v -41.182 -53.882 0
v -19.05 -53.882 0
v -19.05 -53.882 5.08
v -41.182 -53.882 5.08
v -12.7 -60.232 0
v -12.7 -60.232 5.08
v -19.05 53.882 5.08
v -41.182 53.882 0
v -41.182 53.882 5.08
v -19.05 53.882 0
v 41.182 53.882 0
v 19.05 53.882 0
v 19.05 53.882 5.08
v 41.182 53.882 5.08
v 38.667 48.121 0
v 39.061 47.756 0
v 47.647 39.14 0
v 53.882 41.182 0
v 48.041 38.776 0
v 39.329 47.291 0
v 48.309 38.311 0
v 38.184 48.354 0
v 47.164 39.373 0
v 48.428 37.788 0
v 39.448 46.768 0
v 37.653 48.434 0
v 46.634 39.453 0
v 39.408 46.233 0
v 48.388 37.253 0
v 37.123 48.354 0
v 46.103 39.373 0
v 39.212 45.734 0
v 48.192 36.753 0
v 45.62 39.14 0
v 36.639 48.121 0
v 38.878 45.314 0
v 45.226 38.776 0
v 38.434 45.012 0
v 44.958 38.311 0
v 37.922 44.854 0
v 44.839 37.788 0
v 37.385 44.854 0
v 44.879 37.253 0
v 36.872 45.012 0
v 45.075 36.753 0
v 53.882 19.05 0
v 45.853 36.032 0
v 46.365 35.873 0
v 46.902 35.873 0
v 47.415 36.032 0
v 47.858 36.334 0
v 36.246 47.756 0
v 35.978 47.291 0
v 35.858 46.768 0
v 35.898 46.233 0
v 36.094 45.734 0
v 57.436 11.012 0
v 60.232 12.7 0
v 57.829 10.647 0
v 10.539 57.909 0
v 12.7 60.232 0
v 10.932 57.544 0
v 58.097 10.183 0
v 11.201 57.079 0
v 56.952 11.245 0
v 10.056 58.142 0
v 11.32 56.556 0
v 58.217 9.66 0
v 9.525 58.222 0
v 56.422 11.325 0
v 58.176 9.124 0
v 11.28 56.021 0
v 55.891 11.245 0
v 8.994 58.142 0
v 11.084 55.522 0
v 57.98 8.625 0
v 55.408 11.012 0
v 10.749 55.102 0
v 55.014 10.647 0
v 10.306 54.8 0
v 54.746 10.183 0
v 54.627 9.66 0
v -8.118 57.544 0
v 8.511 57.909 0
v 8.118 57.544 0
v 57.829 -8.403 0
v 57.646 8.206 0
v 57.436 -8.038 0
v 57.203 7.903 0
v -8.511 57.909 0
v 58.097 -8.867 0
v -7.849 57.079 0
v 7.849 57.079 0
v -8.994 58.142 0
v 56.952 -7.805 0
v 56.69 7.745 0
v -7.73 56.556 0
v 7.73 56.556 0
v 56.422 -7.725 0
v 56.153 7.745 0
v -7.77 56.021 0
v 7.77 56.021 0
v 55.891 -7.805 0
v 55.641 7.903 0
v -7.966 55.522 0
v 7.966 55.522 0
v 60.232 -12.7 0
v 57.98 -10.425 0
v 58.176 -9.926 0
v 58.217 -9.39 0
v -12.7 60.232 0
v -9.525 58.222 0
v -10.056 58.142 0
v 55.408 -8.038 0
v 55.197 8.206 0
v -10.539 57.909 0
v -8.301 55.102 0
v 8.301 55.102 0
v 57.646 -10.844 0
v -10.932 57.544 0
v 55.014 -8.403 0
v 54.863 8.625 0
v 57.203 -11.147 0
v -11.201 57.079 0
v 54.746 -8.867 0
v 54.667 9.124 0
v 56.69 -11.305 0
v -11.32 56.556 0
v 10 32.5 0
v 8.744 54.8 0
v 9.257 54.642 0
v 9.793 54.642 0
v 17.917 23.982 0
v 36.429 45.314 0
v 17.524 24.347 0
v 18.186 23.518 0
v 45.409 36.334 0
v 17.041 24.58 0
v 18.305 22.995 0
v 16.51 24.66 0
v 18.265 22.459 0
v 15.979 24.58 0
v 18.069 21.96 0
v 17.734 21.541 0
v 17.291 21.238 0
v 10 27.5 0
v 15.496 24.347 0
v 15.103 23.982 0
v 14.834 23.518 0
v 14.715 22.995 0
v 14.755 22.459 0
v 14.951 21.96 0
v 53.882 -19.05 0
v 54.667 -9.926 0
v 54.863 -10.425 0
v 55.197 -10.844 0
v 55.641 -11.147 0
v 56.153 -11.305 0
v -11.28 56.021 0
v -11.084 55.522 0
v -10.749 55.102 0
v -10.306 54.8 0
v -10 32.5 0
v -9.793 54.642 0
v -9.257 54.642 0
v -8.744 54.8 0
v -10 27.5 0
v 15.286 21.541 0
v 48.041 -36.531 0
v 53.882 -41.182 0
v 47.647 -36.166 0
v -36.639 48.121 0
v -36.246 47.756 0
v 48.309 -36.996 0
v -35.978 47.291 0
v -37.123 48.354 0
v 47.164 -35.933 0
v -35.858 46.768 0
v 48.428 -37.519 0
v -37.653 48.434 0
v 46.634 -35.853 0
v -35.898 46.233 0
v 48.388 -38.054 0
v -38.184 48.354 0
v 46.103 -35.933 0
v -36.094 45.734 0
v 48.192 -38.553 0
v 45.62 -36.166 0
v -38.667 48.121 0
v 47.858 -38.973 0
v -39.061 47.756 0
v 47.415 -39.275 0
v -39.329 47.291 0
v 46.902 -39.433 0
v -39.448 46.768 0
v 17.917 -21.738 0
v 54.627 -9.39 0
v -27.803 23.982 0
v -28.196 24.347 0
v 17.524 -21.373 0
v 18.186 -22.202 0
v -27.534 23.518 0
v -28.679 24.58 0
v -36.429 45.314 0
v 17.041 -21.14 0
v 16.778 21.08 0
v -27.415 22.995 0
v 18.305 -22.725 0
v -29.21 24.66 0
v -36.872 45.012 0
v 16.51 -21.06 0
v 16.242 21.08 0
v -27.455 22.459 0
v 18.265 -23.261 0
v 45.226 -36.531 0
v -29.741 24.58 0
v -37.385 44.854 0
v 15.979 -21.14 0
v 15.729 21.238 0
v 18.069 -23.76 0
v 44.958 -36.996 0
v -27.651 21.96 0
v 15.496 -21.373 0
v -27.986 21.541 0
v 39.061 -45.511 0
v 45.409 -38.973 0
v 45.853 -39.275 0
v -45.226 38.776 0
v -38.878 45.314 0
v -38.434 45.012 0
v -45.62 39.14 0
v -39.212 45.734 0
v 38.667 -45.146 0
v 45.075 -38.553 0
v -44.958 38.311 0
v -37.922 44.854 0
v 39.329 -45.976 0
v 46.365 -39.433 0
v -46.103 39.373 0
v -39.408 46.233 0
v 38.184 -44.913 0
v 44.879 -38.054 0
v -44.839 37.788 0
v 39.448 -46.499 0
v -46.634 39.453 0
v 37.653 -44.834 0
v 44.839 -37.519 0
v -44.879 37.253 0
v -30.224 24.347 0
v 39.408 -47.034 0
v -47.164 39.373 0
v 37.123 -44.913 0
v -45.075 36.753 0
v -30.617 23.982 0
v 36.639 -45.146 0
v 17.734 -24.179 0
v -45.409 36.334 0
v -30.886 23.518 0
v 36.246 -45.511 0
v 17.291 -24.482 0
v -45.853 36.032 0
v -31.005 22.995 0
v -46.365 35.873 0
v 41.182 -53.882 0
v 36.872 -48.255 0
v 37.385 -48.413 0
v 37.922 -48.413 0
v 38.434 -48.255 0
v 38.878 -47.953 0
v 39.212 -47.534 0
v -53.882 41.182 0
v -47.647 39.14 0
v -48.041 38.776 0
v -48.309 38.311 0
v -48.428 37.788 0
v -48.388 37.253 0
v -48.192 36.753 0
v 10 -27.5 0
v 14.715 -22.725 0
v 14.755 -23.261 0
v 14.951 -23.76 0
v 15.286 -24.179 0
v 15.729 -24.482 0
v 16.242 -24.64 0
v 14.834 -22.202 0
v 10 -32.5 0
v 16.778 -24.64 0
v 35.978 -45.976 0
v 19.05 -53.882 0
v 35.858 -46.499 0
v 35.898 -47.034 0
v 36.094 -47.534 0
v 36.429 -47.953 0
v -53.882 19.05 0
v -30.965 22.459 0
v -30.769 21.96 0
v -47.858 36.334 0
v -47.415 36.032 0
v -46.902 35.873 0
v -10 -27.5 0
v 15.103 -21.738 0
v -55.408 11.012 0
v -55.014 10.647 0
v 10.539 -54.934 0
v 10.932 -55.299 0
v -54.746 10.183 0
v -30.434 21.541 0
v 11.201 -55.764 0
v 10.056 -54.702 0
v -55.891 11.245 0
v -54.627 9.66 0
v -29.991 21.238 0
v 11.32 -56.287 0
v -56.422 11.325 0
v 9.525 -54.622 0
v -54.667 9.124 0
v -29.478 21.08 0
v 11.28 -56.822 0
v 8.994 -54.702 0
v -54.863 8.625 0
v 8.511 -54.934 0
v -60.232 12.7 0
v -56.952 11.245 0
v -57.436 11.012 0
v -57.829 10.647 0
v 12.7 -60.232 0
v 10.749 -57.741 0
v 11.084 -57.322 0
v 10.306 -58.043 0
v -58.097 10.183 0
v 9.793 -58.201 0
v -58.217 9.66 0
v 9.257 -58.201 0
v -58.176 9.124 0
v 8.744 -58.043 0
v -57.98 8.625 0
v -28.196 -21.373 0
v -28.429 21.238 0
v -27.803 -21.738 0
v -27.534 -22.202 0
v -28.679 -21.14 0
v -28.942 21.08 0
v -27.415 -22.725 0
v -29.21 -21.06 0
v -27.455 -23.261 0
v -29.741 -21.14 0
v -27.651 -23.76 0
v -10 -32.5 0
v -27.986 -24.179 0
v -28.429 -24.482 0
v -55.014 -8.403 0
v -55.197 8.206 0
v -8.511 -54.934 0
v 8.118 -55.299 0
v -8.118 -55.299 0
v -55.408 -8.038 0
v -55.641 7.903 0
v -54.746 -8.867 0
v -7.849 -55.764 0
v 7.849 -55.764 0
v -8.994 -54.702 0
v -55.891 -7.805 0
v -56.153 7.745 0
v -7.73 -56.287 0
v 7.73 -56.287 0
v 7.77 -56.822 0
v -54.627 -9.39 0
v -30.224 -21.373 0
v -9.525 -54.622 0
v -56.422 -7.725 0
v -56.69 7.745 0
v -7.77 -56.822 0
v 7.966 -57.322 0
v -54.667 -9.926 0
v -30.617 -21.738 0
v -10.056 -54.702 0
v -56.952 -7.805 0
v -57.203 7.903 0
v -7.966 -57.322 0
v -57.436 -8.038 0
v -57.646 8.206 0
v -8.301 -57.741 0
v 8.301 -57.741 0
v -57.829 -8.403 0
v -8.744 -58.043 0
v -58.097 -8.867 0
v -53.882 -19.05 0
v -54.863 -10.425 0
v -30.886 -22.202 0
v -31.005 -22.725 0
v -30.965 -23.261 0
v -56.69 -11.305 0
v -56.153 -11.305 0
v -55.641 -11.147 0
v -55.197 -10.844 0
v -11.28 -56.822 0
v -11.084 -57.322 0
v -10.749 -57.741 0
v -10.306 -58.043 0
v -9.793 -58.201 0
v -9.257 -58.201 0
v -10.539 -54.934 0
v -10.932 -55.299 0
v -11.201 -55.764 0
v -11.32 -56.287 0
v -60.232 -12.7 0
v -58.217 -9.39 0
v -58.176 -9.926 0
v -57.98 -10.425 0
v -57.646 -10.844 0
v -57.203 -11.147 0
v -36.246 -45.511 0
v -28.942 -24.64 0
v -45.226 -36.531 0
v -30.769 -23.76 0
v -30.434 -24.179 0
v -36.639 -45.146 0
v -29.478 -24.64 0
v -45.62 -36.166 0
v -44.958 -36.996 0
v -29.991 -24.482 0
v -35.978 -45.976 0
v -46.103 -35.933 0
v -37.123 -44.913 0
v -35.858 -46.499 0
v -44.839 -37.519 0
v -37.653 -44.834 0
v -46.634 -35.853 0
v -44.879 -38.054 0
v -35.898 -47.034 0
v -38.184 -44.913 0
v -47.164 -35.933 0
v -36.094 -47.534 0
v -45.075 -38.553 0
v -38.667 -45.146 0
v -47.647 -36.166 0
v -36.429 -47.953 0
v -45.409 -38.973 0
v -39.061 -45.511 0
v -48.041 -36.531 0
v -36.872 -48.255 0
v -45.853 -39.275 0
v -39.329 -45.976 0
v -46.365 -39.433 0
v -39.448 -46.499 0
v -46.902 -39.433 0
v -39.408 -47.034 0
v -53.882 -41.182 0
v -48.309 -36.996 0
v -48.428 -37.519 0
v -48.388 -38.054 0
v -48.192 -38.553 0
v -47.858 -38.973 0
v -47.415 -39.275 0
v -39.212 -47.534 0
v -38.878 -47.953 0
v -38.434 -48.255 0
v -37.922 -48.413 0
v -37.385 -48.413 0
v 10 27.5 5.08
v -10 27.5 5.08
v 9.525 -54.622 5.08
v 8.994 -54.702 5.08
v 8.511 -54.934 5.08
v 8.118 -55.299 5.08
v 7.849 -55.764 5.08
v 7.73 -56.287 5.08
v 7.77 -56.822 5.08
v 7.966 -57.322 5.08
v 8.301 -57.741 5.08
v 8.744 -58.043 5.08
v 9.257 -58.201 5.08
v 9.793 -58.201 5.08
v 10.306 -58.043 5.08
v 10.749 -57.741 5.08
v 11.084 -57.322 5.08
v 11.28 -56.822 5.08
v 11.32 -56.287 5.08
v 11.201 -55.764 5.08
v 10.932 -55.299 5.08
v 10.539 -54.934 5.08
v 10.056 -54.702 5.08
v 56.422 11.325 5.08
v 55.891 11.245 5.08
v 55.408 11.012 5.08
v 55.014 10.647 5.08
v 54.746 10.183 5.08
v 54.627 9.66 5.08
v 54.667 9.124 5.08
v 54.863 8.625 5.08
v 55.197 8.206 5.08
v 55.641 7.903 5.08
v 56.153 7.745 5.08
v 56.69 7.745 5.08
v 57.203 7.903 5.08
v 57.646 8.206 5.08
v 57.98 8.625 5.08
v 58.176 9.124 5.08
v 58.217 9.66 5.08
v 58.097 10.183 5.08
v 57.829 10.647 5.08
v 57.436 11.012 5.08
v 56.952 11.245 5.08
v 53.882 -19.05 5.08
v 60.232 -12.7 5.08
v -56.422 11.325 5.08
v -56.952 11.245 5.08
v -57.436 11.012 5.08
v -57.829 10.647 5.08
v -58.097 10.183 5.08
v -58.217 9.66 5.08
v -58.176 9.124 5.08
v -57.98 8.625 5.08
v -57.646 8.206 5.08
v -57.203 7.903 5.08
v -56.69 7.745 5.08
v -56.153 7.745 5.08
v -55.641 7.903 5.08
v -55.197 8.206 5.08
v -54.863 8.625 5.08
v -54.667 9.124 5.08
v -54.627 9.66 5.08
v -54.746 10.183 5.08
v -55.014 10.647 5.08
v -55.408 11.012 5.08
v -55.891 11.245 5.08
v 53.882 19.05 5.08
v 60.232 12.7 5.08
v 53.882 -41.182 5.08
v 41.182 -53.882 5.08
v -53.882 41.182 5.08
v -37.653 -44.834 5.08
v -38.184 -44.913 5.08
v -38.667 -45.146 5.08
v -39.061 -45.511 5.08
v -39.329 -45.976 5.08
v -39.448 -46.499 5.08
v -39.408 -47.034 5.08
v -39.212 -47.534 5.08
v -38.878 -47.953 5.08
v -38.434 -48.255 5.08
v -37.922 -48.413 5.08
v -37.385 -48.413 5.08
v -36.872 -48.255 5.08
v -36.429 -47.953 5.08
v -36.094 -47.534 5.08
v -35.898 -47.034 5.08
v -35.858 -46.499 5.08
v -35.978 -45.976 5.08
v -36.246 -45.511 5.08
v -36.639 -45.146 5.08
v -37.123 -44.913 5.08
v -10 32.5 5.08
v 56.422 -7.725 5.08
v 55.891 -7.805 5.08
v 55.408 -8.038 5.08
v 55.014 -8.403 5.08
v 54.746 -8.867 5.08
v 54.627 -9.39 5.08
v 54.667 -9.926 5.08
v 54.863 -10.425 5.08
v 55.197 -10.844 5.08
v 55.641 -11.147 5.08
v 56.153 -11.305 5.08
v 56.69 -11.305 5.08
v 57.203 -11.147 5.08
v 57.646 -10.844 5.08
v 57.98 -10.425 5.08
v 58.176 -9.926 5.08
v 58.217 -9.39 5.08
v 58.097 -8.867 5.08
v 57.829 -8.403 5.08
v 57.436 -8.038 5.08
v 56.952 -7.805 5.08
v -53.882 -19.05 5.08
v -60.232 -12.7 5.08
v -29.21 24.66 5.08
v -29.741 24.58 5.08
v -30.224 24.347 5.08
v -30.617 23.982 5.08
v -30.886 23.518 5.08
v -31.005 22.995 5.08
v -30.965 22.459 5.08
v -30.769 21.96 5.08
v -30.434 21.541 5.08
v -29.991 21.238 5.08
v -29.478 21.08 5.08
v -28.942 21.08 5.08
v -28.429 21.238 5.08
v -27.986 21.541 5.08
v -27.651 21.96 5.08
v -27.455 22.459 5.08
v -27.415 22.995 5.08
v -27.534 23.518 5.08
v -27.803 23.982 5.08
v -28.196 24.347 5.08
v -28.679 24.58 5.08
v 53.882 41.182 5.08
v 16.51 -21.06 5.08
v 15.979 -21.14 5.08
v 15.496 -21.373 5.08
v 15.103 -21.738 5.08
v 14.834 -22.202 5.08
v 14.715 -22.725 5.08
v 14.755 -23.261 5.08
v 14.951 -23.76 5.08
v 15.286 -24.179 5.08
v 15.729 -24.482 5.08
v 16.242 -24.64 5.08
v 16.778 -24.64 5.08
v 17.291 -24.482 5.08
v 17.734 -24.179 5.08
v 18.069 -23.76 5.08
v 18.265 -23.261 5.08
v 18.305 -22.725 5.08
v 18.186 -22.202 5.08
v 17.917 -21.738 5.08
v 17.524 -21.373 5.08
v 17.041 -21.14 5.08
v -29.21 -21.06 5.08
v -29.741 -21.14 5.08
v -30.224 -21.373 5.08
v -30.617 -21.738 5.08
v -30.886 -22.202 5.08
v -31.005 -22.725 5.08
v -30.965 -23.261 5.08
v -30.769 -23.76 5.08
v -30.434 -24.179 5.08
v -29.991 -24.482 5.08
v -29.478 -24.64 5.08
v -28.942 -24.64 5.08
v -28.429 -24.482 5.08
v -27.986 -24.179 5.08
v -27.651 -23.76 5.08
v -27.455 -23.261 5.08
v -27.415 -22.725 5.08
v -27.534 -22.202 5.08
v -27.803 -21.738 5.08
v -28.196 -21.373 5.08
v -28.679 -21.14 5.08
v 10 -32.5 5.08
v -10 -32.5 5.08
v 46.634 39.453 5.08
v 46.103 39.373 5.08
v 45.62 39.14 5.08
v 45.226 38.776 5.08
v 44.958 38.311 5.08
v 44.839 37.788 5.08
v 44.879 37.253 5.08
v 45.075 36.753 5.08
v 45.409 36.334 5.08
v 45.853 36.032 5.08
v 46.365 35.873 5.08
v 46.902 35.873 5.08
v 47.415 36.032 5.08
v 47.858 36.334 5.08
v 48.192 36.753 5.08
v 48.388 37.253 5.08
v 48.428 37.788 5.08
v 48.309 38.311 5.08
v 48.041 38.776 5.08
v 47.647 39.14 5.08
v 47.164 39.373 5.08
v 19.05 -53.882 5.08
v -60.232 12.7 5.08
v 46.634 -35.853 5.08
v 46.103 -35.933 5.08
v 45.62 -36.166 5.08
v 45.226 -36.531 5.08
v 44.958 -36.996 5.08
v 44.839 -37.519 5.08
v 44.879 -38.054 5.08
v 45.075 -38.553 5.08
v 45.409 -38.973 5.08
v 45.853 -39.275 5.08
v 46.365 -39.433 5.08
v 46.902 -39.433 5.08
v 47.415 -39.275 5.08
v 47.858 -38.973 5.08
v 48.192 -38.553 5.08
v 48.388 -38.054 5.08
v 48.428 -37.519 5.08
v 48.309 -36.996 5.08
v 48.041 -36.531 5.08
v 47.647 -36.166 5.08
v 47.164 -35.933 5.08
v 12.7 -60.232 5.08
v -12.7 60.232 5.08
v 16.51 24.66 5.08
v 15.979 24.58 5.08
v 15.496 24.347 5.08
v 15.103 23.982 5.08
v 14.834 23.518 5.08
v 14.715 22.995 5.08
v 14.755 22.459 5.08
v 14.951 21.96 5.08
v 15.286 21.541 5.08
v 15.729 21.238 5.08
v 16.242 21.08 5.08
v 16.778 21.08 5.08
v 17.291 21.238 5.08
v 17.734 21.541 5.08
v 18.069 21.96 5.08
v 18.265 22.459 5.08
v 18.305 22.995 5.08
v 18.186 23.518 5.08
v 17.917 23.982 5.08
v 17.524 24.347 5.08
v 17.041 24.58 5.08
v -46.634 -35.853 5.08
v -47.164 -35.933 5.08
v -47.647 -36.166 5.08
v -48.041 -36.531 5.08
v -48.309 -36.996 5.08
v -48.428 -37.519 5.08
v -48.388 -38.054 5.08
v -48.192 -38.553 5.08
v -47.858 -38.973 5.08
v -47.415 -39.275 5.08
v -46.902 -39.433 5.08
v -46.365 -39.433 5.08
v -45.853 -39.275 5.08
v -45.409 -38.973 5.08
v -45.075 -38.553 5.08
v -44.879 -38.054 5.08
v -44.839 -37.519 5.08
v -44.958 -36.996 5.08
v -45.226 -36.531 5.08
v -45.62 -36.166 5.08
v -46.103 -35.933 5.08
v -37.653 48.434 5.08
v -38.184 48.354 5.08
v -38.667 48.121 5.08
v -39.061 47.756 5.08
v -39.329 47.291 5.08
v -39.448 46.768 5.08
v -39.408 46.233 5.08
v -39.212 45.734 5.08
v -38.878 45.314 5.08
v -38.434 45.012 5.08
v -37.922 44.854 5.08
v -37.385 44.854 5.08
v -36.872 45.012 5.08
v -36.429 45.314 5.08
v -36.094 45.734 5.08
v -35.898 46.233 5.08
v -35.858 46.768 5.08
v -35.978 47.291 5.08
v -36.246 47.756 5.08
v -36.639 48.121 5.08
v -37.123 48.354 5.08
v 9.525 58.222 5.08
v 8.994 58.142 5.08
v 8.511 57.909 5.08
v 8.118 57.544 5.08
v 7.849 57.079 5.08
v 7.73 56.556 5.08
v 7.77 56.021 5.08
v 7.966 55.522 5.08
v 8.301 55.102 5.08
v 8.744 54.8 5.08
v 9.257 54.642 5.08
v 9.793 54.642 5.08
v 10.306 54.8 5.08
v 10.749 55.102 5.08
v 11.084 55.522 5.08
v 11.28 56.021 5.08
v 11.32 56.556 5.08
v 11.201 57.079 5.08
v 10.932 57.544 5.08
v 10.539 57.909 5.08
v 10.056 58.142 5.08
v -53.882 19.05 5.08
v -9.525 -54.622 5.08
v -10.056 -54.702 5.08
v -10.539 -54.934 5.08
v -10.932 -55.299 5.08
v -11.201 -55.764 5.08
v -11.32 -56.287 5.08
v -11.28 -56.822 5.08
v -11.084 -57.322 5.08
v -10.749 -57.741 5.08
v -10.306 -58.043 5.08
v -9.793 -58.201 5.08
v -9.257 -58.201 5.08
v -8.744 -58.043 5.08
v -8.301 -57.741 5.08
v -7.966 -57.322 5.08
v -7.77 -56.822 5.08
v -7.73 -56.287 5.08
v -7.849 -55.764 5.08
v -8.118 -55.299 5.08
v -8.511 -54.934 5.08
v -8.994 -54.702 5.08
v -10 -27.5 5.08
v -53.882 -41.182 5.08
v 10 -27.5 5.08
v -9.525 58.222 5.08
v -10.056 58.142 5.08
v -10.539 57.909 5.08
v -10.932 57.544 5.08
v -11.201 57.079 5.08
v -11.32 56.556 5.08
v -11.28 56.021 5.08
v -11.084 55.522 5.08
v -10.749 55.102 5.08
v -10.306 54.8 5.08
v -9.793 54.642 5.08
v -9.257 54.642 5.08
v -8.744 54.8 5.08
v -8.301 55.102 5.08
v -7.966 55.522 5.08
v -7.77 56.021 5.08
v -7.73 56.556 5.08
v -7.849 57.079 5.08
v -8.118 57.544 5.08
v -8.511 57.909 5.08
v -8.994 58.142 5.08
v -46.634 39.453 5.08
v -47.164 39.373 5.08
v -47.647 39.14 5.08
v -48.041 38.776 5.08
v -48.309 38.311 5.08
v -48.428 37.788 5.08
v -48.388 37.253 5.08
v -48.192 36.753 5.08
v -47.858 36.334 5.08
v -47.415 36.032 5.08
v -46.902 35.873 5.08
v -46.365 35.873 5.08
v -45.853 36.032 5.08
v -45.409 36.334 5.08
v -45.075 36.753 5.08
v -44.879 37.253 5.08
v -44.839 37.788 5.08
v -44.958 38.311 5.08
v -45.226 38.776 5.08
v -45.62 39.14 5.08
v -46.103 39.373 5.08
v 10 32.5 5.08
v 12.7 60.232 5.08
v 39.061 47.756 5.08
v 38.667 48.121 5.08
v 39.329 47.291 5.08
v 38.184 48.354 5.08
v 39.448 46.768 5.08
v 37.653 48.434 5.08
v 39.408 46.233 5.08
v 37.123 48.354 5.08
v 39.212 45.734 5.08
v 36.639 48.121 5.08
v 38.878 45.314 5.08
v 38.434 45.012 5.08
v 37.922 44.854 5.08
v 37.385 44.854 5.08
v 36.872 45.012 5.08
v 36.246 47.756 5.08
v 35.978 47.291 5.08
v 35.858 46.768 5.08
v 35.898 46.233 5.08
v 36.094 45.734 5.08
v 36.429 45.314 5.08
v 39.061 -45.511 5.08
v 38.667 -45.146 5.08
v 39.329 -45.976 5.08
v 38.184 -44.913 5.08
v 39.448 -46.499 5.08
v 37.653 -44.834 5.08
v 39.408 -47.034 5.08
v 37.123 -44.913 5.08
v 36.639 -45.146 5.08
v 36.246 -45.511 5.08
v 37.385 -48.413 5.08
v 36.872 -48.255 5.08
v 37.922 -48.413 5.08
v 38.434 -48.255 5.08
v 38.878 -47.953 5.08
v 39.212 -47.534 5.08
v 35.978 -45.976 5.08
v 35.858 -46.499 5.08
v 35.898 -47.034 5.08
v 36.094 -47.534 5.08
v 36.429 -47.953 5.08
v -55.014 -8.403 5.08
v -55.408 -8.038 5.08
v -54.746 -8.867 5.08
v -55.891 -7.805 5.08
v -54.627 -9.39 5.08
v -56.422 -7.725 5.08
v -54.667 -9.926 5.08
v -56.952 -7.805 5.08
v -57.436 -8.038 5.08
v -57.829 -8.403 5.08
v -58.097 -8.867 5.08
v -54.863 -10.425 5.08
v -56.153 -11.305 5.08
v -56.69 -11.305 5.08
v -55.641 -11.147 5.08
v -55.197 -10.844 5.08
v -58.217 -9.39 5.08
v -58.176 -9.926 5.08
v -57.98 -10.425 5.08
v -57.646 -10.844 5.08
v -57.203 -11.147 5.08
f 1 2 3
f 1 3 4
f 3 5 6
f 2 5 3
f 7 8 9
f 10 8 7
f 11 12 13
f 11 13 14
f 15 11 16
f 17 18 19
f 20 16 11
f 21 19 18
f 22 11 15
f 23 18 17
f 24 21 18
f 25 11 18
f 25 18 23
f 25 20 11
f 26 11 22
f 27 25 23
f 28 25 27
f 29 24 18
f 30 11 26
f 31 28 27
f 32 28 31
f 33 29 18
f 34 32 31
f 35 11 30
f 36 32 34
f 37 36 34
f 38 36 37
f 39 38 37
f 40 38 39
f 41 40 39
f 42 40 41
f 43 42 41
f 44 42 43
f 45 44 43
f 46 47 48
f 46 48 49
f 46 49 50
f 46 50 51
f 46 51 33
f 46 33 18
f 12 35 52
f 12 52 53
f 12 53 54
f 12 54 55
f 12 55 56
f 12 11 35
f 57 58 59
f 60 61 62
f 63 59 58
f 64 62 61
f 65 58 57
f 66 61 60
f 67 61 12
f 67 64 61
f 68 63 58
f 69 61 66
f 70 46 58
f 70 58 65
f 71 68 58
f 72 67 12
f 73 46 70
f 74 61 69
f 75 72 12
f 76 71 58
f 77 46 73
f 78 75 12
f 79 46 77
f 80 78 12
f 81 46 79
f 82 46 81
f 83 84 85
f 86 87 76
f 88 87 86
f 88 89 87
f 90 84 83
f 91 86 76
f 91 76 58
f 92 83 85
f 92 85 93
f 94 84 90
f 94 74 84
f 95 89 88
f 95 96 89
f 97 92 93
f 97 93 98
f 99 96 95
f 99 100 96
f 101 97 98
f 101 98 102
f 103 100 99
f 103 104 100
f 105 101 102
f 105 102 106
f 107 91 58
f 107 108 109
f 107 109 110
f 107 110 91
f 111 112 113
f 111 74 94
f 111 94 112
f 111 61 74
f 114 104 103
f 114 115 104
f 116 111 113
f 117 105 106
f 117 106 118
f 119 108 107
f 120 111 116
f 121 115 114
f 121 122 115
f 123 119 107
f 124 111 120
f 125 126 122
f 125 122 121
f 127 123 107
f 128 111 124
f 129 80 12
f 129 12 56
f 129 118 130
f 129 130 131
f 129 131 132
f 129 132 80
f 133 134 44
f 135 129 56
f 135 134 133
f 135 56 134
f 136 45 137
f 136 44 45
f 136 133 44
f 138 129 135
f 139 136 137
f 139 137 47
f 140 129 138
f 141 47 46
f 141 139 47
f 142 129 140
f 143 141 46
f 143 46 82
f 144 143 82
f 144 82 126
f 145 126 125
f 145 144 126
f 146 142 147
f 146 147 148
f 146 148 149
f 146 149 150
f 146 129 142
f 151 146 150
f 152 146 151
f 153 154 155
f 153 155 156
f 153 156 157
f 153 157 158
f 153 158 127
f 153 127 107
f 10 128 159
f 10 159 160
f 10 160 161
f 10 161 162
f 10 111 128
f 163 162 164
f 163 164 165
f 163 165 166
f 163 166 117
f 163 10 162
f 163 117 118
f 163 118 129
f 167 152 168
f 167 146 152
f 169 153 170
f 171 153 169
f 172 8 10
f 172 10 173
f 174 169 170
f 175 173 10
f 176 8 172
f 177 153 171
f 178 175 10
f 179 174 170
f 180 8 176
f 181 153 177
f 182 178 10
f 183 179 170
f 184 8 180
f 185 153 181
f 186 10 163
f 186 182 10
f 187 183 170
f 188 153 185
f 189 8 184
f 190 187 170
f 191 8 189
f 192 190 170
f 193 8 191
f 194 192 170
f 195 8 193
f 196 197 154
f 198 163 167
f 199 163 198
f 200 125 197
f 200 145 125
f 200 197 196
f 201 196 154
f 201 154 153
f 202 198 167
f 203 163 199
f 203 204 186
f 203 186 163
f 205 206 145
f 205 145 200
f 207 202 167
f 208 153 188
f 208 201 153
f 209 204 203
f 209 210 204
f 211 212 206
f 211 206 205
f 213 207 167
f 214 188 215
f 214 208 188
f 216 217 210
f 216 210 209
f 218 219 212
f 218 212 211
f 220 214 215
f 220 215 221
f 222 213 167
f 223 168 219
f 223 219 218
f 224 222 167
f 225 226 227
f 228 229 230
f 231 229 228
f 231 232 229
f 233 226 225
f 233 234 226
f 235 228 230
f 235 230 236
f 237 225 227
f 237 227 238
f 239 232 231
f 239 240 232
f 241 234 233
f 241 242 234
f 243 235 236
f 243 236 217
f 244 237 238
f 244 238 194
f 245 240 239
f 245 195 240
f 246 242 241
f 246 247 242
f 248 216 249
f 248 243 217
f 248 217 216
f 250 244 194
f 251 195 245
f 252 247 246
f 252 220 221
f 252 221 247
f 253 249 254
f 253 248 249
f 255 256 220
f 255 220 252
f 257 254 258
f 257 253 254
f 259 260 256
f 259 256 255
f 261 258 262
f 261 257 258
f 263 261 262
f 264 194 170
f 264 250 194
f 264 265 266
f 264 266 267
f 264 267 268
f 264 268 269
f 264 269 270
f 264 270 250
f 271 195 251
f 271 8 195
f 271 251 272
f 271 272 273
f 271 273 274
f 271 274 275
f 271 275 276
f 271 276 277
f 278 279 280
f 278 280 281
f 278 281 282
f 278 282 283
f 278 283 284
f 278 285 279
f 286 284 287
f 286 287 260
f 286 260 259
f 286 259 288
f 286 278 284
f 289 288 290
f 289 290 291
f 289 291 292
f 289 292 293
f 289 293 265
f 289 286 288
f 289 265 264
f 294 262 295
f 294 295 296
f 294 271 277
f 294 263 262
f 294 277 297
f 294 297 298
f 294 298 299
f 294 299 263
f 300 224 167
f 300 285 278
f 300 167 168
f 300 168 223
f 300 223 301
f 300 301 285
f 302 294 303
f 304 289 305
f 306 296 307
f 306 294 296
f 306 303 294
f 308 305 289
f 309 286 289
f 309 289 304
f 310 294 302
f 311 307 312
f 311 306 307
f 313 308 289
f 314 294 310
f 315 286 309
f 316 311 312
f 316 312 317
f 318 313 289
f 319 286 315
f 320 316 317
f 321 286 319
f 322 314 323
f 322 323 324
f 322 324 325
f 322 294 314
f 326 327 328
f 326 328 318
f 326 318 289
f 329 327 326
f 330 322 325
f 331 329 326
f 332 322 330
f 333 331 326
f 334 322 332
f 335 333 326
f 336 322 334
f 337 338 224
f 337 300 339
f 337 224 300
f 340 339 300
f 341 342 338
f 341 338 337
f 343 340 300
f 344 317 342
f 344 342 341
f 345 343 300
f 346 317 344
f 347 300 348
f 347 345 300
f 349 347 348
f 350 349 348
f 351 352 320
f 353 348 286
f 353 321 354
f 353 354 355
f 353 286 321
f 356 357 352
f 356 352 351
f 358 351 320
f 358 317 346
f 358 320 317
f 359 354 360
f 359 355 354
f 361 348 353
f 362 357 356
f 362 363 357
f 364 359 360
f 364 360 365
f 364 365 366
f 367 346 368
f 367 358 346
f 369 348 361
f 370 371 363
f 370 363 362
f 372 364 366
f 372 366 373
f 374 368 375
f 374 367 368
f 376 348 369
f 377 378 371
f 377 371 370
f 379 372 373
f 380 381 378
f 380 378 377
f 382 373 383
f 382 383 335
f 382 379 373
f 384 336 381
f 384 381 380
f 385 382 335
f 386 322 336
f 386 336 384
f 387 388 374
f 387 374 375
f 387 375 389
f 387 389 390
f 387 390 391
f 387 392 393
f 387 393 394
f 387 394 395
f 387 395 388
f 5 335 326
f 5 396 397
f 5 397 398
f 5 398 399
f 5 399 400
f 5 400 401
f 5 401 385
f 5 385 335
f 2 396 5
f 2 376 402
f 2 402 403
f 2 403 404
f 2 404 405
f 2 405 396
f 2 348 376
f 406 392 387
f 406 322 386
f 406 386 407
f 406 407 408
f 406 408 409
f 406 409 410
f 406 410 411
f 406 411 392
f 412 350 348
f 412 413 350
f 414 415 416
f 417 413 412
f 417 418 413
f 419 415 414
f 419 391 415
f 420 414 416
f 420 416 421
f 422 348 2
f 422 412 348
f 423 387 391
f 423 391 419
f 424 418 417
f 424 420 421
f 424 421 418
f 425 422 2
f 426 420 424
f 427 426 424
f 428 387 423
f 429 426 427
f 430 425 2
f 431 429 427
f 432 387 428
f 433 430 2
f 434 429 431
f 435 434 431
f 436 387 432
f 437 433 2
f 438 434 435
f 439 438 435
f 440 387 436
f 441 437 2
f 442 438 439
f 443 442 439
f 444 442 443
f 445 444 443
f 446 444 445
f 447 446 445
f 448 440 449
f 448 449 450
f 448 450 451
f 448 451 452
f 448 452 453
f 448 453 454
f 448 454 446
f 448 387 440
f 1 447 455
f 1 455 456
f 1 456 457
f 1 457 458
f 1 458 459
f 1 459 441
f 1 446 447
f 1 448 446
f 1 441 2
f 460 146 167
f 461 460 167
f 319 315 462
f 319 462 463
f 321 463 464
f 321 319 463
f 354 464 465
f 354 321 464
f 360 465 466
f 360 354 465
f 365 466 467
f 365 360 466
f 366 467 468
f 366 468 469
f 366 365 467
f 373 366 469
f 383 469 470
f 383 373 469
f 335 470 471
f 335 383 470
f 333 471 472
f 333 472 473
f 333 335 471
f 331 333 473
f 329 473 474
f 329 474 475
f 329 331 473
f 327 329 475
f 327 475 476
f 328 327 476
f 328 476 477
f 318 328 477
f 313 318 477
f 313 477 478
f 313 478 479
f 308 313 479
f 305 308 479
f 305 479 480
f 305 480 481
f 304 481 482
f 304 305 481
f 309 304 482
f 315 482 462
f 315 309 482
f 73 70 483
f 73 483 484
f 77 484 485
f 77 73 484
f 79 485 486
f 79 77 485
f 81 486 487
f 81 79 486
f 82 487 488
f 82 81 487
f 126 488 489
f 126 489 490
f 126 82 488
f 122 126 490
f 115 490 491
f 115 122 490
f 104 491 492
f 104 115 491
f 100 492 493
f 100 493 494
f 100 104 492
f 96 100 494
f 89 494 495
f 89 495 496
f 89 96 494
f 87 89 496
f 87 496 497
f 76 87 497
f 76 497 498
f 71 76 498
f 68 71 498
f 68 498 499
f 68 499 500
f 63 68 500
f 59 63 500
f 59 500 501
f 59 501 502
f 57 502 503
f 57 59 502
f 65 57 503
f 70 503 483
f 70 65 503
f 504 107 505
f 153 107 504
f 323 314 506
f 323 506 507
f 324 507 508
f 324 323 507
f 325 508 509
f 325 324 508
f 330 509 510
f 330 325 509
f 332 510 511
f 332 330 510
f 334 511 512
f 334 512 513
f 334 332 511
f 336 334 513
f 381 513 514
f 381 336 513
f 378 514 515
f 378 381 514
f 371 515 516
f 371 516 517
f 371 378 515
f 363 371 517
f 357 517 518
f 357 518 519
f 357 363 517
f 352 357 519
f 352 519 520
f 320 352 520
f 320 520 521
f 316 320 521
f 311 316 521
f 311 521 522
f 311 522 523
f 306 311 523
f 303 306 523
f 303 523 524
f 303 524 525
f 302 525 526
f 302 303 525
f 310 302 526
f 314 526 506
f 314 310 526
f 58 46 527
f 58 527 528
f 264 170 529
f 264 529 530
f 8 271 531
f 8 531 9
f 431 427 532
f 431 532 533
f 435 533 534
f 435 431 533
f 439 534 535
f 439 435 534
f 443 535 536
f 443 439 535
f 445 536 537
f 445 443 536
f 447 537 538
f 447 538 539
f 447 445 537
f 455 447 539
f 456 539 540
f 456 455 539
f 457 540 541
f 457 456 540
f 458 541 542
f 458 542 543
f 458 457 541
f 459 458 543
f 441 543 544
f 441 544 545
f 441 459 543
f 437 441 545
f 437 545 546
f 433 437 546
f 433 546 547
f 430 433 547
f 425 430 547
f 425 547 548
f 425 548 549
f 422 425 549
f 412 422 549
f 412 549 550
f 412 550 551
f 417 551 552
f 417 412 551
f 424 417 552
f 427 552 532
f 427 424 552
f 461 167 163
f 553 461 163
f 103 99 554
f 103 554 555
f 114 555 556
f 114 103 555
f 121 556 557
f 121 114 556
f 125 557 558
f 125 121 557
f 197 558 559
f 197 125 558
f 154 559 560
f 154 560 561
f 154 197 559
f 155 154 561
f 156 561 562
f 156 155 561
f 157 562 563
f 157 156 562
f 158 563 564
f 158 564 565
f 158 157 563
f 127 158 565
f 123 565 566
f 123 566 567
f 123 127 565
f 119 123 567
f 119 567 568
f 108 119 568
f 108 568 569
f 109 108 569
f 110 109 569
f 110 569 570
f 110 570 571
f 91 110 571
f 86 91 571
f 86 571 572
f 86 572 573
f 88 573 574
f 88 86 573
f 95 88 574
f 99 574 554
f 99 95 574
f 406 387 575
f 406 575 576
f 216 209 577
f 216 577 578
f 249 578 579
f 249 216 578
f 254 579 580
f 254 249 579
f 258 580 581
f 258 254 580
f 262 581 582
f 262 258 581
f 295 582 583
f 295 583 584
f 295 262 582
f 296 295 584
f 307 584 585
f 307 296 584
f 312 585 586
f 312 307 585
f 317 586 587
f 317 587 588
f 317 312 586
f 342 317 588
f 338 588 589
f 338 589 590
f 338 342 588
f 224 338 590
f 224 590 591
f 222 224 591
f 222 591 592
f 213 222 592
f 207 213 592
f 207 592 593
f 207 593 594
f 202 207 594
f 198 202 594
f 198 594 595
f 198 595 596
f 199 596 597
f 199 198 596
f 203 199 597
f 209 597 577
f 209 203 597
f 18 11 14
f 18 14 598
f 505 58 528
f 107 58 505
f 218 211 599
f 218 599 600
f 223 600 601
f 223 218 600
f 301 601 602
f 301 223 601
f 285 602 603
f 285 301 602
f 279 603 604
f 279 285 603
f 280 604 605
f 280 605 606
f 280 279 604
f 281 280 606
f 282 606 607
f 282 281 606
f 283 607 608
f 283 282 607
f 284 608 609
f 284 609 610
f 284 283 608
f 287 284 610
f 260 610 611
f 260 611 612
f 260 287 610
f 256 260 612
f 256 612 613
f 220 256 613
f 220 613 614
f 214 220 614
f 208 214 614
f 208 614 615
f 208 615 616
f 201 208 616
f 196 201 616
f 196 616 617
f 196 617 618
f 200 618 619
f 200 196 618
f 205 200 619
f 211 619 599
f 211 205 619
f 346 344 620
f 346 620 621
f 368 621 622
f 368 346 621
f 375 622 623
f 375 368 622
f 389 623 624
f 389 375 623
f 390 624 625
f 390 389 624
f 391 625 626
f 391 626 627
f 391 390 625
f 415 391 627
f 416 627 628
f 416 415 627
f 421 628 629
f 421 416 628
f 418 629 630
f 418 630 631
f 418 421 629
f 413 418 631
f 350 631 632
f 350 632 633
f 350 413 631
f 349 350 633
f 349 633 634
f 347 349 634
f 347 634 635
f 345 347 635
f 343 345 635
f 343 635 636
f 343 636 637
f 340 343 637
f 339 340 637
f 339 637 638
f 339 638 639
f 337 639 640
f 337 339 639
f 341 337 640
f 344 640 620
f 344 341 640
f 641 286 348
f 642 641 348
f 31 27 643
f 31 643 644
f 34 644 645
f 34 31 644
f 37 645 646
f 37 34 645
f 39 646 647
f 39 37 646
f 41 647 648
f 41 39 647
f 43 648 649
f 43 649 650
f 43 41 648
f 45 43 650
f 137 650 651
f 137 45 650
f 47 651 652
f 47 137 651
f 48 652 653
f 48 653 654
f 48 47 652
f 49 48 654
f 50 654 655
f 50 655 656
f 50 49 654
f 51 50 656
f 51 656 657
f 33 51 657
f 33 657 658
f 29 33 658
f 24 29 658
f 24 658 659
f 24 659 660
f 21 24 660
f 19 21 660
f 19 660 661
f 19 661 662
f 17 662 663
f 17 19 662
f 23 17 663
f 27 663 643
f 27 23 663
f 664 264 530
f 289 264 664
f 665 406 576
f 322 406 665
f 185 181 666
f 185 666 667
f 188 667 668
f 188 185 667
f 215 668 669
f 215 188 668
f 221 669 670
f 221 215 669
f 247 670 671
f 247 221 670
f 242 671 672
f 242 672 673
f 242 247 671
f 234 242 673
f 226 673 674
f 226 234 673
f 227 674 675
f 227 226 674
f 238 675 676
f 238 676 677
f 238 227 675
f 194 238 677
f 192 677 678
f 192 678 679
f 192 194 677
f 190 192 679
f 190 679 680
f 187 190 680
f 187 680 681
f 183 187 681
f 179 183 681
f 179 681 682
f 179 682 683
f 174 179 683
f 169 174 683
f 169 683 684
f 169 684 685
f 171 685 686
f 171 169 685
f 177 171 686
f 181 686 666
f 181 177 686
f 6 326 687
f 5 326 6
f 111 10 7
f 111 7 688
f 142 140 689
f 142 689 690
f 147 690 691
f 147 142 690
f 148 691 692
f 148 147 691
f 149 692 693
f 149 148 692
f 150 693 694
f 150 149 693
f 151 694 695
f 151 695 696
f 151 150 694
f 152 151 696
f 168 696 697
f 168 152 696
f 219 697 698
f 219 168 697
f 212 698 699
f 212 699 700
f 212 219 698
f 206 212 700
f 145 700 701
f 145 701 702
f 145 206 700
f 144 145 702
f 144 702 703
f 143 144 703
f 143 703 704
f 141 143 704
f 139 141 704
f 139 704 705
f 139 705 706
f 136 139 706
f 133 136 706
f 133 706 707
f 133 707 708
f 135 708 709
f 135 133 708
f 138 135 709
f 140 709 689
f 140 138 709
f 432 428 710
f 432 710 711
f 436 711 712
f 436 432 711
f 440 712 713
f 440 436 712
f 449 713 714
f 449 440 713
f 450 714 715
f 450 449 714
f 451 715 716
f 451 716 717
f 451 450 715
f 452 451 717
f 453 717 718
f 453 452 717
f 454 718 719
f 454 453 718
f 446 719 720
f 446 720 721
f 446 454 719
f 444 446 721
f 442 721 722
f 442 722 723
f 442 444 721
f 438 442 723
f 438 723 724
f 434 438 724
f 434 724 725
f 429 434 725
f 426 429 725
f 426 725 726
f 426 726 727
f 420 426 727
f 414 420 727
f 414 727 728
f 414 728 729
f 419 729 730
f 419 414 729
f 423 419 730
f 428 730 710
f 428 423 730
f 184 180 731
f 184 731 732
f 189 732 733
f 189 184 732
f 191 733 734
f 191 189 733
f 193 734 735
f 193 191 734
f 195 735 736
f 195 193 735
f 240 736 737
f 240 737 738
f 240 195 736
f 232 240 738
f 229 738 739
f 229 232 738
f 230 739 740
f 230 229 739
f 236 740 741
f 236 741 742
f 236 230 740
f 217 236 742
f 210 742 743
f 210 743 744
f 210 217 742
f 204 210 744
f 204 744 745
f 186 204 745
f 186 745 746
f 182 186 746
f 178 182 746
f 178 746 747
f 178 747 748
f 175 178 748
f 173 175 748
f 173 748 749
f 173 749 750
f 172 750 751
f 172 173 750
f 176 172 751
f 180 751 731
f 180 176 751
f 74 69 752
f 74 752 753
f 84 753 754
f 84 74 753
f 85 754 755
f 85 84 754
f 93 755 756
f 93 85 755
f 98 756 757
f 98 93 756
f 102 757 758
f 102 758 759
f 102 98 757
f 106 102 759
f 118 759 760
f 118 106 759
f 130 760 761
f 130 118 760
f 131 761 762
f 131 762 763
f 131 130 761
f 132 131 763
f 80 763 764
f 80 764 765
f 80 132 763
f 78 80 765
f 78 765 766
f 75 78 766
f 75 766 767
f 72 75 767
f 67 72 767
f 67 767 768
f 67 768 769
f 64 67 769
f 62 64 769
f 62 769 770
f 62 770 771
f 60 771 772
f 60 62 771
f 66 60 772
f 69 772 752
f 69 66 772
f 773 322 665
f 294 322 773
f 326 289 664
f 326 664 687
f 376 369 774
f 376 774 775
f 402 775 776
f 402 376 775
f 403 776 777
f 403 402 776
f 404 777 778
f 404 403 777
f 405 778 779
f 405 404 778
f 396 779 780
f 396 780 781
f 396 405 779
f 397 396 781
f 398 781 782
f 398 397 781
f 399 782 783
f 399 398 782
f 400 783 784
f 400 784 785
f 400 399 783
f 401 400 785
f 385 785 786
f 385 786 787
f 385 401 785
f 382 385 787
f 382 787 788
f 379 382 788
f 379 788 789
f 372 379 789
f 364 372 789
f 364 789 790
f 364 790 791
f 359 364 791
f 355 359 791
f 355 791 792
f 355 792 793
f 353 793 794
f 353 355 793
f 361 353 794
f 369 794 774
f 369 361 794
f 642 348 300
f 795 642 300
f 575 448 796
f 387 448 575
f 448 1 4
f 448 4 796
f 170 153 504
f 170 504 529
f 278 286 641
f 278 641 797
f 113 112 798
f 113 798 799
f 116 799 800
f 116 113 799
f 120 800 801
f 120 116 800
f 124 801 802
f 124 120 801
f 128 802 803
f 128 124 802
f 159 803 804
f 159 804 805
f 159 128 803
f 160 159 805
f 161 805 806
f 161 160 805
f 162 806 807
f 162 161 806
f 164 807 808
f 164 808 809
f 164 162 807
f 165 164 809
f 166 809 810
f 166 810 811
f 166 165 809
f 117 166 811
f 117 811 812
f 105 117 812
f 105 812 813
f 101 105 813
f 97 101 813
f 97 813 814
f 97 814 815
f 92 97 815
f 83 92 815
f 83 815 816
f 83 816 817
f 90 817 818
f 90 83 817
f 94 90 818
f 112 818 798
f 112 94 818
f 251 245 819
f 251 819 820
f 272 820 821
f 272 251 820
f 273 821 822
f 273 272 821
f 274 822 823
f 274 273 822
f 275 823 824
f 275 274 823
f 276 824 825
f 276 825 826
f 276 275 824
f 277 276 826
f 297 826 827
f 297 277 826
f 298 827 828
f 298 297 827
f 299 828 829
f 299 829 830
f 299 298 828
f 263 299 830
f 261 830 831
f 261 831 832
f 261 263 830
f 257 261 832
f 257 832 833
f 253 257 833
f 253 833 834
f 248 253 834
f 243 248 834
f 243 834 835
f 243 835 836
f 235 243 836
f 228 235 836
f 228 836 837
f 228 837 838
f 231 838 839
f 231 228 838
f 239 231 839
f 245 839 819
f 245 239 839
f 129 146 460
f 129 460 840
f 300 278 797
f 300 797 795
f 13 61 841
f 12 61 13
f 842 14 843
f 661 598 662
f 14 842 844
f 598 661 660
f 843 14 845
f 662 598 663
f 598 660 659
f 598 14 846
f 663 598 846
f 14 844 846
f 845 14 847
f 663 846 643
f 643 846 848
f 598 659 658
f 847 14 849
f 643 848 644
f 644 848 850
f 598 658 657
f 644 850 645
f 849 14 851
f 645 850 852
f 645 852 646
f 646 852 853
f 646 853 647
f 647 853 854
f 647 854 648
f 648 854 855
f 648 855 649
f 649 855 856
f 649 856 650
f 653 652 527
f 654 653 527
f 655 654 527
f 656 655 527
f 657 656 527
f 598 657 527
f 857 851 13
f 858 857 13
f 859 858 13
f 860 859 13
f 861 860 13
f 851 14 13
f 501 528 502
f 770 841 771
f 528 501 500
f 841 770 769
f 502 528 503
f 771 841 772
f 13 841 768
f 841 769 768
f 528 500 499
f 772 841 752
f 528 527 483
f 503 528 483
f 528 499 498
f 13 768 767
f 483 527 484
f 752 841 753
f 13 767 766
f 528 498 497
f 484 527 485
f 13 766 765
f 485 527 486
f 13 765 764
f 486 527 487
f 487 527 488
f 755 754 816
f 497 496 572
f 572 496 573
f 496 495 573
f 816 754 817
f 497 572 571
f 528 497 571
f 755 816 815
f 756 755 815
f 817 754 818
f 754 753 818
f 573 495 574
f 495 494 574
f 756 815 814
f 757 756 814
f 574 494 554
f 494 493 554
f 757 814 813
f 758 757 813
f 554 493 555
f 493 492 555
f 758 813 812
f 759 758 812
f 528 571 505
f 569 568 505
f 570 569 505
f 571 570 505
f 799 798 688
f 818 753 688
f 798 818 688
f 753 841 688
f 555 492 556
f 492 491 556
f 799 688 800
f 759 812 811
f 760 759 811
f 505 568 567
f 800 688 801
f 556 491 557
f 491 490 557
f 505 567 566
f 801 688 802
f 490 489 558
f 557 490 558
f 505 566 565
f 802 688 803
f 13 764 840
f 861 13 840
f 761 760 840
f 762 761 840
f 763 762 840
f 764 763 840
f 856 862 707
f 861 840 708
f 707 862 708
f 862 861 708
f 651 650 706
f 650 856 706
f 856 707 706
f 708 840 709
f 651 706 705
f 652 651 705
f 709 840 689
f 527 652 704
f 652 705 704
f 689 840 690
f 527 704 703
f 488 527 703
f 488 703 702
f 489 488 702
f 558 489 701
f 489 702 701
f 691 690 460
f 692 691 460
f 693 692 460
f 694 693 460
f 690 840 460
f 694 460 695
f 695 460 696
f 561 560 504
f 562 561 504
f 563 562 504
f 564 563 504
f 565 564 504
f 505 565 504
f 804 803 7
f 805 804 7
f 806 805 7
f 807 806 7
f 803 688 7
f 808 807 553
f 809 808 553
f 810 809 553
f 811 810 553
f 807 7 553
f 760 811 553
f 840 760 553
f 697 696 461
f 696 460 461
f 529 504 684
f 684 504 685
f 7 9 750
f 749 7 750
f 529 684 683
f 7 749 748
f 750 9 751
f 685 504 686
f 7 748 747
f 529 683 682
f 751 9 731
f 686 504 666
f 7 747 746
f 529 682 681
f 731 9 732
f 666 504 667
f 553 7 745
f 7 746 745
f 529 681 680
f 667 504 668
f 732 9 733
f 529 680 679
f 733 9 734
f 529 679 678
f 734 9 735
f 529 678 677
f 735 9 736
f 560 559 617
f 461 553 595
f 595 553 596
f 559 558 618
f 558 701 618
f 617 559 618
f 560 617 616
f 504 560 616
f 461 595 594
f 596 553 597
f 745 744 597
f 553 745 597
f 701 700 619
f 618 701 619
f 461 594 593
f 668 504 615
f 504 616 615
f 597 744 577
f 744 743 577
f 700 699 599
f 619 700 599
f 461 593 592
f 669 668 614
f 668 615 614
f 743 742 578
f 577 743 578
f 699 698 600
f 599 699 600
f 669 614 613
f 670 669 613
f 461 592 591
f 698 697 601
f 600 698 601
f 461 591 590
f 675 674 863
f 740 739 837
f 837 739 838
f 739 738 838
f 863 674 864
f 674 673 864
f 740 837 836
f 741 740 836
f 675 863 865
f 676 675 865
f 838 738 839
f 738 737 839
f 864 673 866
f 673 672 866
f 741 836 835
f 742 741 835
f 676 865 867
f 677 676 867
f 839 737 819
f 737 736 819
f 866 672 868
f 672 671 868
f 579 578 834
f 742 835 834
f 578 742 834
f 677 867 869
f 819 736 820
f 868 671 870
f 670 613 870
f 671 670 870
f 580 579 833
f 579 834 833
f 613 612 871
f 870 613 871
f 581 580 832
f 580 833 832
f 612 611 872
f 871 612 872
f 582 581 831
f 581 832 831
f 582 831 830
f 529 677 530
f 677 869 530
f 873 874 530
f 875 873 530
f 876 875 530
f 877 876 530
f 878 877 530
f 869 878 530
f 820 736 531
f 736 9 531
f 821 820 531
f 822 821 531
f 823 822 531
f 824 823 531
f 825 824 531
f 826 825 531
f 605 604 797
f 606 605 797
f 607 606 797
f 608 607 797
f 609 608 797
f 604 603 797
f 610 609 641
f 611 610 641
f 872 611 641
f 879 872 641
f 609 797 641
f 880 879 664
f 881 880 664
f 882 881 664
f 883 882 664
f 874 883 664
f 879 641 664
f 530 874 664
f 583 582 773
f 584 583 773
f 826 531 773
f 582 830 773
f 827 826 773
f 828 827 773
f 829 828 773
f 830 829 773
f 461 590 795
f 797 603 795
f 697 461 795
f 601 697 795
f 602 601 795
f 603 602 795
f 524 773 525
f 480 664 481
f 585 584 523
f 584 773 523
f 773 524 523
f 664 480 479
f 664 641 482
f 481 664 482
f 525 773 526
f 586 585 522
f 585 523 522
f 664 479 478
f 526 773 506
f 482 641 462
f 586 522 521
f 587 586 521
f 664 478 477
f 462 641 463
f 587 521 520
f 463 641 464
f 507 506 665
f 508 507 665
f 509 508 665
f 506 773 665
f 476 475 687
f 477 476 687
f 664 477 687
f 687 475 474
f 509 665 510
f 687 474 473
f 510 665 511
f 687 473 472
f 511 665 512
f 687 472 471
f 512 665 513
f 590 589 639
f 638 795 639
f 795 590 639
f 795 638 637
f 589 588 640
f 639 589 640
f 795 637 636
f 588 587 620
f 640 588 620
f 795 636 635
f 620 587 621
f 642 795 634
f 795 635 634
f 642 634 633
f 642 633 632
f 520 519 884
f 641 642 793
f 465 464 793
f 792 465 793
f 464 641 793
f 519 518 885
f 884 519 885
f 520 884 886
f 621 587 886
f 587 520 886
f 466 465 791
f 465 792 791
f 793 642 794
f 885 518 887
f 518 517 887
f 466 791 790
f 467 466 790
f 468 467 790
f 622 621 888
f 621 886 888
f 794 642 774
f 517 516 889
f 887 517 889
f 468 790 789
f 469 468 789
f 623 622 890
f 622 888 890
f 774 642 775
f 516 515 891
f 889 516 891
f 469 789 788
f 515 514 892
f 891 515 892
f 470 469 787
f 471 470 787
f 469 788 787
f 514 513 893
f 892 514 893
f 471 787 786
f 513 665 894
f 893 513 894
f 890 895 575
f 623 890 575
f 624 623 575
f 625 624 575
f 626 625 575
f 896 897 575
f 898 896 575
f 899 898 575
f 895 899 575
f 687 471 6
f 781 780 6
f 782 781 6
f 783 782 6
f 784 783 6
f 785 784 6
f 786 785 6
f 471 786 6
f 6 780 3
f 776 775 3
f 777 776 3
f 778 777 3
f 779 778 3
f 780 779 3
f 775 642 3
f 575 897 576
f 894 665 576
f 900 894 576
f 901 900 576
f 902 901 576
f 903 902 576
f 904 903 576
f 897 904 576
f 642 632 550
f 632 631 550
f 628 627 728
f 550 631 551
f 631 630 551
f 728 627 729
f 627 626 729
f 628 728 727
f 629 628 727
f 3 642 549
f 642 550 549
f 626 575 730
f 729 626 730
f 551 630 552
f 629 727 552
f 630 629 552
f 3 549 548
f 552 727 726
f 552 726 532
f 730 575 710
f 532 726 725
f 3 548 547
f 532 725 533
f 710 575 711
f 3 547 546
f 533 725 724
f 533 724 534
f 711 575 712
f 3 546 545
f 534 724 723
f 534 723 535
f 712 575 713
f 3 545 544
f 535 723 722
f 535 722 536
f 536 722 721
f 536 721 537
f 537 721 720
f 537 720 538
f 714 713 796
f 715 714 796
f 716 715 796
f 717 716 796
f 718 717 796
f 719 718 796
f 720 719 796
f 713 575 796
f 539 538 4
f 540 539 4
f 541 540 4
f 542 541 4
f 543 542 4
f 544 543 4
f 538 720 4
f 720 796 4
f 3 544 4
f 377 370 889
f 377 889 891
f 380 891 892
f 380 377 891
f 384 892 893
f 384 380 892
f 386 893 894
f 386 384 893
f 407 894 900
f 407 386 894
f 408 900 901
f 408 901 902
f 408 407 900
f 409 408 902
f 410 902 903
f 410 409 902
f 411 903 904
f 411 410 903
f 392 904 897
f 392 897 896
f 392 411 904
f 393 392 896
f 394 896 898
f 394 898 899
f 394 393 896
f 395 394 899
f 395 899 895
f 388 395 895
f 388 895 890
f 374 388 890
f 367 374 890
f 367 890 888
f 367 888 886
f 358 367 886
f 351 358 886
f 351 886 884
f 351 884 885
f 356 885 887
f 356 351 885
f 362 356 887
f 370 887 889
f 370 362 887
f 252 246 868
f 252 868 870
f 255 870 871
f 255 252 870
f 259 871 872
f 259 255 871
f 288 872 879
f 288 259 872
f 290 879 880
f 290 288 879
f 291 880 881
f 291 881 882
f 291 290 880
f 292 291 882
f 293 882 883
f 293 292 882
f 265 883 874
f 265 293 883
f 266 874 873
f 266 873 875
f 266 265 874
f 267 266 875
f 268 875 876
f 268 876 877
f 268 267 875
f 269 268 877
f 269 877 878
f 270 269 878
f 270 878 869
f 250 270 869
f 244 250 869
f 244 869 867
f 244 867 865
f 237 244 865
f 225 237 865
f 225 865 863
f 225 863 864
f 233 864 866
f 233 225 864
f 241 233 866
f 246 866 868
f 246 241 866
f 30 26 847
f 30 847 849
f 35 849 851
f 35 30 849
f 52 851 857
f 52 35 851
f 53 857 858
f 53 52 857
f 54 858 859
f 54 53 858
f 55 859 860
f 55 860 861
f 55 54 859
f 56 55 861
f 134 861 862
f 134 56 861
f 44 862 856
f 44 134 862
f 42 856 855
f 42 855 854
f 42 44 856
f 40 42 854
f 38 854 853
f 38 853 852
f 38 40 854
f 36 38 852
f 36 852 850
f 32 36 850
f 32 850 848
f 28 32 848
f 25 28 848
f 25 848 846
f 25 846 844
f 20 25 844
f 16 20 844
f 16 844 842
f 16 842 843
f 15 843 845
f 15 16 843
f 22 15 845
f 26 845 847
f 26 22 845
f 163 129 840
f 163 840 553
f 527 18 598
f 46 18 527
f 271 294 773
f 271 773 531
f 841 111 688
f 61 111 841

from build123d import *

# Parameters (mm, degrees)
SKETCH1_R           = 1.8
SKETCH1_W           = 5
SKETCH1_H           = 20
BOSS_EXTRUDE1_DEPTH = 5.08


with BuildPart() as part:
    # Sketch1 → Boss-Extrude1 (new body)
    with BuildSketch(Plane(origin=(0, 0, 0), x_dir=(0, 1, 0), z_dir=(0, 0, 1))):
        Polygon((-41.181536726, 53.881536726), (-19.05, 53.881536726), (-12.7, 60.231536726), (12.7, 60.231536726), (19.05, 53.881536726), (41.181536726, 53.881536726), (53.881536726, 41.181536726), (53.881536726, 19.05), (60.231536726, 12.7), (60.231536726, -12.7), (53.881536726, -19.05), (53.881536726, -41.181536726), (41.181536726, -53.881536726), (19.05, -53.881536726), (12.7, -60.231536726), (-12.7, -60.231536726), (-19.05, -53.881536726), (-41.181536726, -53.881536726), (-53.881536726, -41.181536726), (-53.881536726, -19.05), (-60.231536726, -12.7), (-60.231536726, 12.7), (-53.881536726, 19.05), (-53.881536726, 41.181536726), align=None)
        with Locations((-46.633511114, -37.653254993)):
            Circle(SKETCH1_R, mode=Mode.SUBTRACT)
        with Locations((-37.653254993, -46.633511114)):
            Circle(SKETCH1_R, mode=Mode.SUBTRACT)
        with Locations((46.633511114, -37.653254993)):
            Circle(SKETCH1_R, mode=Mode.SUBTRACT)
        with Locations((37.653254993, -46.633511114)):
            Circle(SKETCH1_R, mode=Mode.SUBTRACT)
        with Locations((-46.633511114, 37.653254993)):
            Circle(SKETCH1_R, mode=Mode.SUBTRACT)
        with Locations((-37.653254993, 46.633511114)):
            Circle(SKETCH1_R, mode=Mode.SUBTRACT)
        with Locations((37.653254993, 46.633511114)):
            Circle(SKETCH1_R, mode=Mode.SUBTRACT)
        with Locations((46.633511114, 37.653254993)):
            Circle(SKETCH1_R, mode=Mode.SUBTRACT)
        with Locations((-22.86, -16.51)):
            Circle(SKETCH1_R, mode=Mode.SUBTRACT)
        with Locations((22.86, -16.51)):
            Circle(SKETCH1_R, mode=Mode.SUBTRACT)
        with Locations((22.86, 29.21)):
            Circle(SKETCH1_R, mode=Mode.SUBTRACT)
        with Locations((-22.86, 29.21)):
            Circle(SKETCH1_R, mode=Mode.SUBTRACT)
        with Locations((9.525, -56.421536726)):
            Circle(SKETCH1_R, mode=Mode.SUBTRACT)
        with Locations((-9.525, -56.421536726)):
            Circle(SKETCH1_R, mode=Mode.SUBTRACT)
        with Locations((-56.421536726, -9.525)):
            Circle(SKETCH1_R, mode=Mode.SUBTRACT)
        with Locations((-56.421536726, 9.525)):
            Circle(SKETCH1_R, mode=Mode.SUBTRACT)
        with Locations((-9.525, 56.421536726)):
            Circle(SKETCH1_R, mode=Mode.SUBTRACT)
        with Locations((9.525, 56.421536726)):
            Circle(SKETCH1_R, mode=Mode.SUBTRACT)
        with Locations((56.421536726, 9.525)):
            Circle(SKETCH1_R, mode=Mode.SUBTRACT)
        with Locations((56.421536726, -9.525)):
            Circle(SKETCH1_R, mode=Mode.SUBTRACT)
        with Locations((-30, 0)):
            Rectangle(SKETCH1_W, SKETCH1_H, mode=Mode.SUBTRACT)
        with Locations((30, 0)):
            Rectangle(SKETCH1_W, SKETCH1_H, mode=Mode.SUBTRACT)
    extrude(amount=BOSS_EXTRUDE1_DEPTH)


solid = part.part
